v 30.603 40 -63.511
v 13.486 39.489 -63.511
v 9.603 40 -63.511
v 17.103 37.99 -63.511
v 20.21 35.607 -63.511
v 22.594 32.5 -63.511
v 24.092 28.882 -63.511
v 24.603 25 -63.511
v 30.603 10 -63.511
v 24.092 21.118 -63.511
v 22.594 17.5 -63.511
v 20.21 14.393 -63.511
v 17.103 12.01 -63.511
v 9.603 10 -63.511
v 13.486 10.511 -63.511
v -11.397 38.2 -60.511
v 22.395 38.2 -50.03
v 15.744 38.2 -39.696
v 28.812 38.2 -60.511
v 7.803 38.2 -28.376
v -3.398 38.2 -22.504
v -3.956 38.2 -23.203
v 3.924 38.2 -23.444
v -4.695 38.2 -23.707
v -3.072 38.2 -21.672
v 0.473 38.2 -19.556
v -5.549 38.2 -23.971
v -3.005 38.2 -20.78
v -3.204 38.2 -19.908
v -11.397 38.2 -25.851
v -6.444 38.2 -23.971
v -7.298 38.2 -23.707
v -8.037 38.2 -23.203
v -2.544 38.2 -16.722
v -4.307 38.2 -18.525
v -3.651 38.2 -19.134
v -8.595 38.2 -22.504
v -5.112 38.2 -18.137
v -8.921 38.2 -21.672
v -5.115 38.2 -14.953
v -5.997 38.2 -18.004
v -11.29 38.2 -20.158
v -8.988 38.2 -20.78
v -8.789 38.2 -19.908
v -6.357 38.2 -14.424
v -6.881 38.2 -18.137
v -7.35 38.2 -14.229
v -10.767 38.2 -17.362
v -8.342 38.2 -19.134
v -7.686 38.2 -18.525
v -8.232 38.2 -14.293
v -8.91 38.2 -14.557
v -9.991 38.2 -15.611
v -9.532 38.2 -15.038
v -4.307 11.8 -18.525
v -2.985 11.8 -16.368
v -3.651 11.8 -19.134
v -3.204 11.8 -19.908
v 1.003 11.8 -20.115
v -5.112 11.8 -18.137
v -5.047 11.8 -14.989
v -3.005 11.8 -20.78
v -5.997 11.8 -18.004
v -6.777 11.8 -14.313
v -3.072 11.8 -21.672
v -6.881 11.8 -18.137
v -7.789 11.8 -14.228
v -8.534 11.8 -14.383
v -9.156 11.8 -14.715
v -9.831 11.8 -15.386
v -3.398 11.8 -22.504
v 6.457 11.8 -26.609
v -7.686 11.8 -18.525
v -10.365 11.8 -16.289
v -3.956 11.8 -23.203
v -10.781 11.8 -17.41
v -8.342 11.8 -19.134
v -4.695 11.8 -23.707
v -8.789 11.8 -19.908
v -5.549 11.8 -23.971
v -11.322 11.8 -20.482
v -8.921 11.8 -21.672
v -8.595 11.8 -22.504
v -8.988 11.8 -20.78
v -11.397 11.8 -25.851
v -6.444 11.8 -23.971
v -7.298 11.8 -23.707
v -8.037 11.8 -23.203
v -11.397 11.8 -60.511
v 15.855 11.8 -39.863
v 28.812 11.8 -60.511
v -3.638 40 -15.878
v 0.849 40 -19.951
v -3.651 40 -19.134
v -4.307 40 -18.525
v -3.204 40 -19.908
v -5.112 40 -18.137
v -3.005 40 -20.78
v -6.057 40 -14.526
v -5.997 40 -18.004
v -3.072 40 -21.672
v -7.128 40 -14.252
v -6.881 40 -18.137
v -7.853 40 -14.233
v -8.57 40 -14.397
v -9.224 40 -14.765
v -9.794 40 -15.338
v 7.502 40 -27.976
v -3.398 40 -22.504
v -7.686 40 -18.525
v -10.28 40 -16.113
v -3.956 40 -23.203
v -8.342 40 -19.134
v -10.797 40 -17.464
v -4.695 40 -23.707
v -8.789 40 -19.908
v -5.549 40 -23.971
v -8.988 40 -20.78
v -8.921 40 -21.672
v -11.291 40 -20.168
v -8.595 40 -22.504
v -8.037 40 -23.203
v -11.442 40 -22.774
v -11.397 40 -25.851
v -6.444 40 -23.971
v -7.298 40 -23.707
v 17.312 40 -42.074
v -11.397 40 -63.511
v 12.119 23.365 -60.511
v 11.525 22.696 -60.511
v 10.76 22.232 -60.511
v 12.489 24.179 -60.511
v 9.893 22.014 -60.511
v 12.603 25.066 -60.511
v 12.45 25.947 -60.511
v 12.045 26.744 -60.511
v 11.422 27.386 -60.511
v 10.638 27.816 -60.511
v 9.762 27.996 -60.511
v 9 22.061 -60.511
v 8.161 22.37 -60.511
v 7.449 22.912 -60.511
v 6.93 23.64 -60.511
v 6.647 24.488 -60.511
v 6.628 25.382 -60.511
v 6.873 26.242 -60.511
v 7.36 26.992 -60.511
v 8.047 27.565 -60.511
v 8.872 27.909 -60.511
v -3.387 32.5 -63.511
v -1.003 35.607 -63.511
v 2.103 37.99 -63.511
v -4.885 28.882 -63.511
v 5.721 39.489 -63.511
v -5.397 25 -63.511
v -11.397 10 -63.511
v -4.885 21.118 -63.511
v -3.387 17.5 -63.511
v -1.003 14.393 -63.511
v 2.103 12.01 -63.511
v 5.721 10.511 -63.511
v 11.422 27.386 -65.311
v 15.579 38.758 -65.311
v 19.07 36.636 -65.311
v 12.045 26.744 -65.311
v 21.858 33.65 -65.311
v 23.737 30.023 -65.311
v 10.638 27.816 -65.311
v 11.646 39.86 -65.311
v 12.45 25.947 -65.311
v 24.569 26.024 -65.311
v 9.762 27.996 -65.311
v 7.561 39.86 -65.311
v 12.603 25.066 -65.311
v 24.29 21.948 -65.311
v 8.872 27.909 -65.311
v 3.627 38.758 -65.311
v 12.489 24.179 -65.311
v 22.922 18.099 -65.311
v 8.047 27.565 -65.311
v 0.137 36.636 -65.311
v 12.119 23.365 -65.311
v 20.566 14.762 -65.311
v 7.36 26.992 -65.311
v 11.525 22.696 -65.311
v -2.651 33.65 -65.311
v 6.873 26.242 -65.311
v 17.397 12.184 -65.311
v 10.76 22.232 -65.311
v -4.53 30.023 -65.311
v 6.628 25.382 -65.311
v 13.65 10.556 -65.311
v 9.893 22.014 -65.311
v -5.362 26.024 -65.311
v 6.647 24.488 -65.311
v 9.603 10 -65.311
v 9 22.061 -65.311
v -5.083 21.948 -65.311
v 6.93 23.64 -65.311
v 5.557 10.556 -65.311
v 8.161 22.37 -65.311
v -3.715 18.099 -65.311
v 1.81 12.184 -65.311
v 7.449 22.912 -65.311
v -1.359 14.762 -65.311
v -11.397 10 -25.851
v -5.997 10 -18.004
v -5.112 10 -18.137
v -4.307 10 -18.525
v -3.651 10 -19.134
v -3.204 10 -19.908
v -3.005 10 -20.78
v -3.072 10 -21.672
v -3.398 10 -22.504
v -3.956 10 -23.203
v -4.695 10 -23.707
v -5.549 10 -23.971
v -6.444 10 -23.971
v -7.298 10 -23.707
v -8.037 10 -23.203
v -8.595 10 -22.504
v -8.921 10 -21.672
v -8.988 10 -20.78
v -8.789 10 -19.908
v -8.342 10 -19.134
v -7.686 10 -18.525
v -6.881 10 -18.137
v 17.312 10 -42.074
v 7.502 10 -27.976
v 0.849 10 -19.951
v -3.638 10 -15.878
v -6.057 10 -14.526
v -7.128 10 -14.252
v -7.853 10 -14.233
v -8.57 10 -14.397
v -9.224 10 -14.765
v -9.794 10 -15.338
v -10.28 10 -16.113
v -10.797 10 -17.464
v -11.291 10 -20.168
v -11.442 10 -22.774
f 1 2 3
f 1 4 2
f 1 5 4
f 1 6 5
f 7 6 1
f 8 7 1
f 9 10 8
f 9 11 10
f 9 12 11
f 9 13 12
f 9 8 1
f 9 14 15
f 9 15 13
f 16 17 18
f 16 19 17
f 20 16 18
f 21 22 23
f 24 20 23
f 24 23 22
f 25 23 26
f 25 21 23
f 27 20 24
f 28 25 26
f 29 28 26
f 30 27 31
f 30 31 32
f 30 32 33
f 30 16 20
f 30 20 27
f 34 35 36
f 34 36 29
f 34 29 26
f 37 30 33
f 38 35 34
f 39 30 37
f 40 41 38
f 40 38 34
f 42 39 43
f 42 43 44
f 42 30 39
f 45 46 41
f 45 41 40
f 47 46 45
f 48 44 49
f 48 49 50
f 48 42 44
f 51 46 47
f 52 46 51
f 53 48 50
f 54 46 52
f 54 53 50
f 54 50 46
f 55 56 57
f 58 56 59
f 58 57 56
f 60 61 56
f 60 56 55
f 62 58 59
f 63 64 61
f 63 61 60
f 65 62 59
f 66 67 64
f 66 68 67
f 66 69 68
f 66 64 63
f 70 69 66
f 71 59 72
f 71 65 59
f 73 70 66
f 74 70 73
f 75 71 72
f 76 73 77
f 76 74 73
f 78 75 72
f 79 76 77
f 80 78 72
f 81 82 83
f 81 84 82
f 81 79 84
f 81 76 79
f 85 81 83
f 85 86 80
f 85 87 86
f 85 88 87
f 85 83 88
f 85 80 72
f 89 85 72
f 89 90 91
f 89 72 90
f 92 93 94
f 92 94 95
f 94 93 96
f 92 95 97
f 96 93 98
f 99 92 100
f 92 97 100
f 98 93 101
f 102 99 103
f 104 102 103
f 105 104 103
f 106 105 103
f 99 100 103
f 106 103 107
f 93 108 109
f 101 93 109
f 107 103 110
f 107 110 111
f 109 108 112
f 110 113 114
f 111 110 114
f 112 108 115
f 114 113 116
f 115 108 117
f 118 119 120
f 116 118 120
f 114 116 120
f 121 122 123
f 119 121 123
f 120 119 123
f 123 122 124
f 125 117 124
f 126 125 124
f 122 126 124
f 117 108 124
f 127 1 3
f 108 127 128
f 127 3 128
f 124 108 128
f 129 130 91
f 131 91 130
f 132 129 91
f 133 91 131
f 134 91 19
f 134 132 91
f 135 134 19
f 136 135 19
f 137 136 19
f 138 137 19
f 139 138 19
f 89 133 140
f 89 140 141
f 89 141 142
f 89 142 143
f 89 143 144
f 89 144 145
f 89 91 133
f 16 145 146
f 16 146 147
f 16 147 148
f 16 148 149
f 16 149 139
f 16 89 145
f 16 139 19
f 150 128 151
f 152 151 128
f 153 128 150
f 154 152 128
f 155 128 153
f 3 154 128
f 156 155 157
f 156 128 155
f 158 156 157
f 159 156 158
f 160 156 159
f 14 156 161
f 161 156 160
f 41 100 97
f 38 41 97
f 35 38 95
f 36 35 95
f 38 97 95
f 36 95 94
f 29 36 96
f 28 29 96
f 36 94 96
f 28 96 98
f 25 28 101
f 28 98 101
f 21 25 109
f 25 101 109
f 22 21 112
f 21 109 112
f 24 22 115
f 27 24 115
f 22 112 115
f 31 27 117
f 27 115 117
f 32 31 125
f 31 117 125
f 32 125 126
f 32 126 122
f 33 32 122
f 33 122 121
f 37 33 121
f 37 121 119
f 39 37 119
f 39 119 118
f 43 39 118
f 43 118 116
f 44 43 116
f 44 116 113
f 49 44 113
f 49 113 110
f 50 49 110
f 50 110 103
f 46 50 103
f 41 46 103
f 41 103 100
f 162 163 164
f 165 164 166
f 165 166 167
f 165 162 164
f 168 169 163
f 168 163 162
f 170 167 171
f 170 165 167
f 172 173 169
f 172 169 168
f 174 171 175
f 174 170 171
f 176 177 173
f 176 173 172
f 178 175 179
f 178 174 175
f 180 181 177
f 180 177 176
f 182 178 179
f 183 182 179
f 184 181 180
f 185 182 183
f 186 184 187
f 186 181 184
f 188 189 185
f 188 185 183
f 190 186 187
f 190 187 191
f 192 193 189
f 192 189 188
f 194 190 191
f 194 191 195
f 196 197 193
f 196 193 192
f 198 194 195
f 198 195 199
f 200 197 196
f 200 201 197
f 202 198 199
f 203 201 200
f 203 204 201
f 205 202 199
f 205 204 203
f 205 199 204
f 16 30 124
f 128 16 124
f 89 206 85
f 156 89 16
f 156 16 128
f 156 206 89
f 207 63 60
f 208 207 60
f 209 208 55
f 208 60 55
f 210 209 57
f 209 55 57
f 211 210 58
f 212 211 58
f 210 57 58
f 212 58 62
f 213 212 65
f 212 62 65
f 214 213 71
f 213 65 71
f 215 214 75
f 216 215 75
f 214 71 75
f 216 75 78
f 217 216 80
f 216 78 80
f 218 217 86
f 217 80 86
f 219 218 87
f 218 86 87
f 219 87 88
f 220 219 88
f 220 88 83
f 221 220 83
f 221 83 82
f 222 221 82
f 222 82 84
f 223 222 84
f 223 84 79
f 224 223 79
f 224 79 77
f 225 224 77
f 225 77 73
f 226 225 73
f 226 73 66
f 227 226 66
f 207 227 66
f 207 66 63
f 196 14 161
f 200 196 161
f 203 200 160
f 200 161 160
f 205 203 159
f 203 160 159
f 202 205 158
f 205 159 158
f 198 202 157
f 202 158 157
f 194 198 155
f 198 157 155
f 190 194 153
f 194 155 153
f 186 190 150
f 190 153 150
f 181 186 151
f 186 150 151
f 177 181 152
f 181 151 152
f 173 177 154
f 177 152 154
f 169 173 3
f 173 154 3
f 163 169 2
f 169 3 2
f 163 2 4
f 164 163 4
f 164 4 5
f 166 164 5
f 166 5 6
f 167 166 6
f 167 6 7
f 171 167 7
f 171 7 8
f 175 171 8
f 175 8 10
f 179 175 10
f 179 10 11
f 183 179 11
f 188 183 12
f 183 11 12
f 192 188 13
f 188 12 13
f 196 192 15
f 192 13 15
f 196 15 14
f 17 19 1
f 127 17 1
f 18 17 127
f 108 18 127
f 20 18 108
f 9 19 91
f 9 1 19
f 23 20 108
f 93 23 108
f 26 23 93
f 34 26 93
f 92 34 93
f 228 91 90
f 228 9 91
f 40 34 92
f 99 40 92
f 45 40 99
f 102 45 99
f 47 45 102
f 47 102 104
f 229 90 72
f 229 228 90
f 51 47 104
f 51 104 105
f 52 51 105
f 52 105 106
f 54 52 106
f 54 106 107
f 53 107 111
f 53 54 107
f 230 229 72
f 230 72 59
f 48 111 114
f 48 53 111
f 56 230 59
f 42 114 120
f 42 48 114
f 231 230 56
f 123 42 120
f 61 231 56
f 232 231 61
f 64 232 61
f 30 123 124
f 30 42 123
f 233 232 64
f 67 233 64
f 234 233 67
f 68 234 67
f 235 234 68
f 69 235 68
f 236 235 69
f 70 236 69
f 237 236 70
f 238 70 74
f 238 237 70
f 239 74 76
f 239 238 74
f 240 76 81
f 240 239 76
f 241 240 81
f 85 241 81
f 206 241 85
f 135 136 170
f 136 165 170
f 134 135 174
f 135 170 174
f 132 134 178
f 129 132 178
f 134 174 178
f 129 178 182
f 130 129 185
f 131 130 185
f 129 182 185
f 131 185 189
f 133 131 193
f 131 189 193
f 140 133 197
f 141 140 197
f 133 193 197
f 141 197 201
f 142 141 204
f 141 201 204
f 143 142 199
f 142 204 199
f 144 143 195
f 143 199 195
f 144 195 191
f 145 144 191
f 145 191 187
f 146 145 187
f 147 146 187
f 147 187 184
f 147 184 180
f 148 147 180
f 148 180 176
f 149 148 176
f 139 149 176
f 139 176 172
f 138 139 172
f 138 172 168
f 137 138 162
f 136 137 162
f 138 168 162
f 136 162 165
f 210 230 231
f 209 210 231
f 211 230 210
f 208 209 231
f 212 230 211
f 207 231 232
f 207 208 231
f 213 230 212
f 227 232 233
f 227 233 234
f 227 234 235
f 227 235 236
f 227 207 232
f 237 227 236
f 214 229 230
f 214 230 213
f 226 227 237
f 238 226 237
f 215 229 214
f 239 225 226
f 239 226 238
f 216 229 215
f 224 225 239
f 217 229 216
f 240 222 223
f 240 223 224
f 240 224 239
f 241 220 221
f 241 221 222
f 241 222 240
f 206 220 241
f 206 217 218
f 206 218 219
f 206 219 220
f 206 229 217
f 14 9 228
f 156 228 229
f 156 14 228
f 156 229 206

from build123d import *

# Parameters (mm, degrees)
EXTRUDE_1_DEPTH      = 50
SKETCH_2_R           = 4.999999999999998
CUT_EXTRUDE_1_DEPTH  = 98.87084830229739
SKETCH_3_R           = 15
EXTRUDE_2_DEPTH      = 3
CUT_EXTRUDE_3_REACH  = 108.899
SKETCH_5_R           = 5.000000000000001
SKETCH_6_R           = 5.0000000000000036
CUT_EXTRUDE_5_DEPTH  = 107.89919436089083
CUT_EXTRUDE_7_DEPTH  = 120.99999999999977
CUT_EXTRUDE_10_DEPTH = 10
SKETCH_9_R           = 25
SKETCH_9_R_2         = 15
EXTRUDE_3_DEPTH      = 3
SKETCH_10_R          = 5.0000000000000036
EXTRUDE_4_DEPTH      = 8
SKETCH_11_W          = 70
SKETCH_11_H          = 50.00000000000001
CUT_EXTRUDE_11_DEPTH = 8
SKETCH_12_R          = 25.000000000000004
EXTRUDE_6_DEPTH      = 3
CUT_EXTRUDE_14_DEPTH = 6.500000000000001
SCALE_1_SCALE        = 0.5
SCALE_2_SCALE        = 1.2


with BuildPart() as part:
    # 草图1 → 凸台-拉伸1 (new body)
    with BuildSketch(Plane(origin=(0, 0, 0), x_dir=(1, 0, 0), z_dir=(0, 1, 0))):
        with BuildLine():
            Line((-23.323422211177558, 7.232068902691513), (-23.323422211177558, 70))
            Line((-23.323422211177558, 70), (46.67657778882245, 70))
            add(Edge.make_bspline(
                [(46.67657778882245, 70), (-25.880344692728325, -52.054397164609135), (-23.323422211177558, 7.232068902691513)],
                knots=[0, 0, 0, 1, 1, 1], degree=2))
        make_face()
    extrude(amount=EXTRUDE_1_DEPTH)

    # 草图2 → 切除-拉伸1 (cut, through all)
    with BuildSketch(Plane(origin=(0, 50, 0), x_dir=(1, 0, 0), z_dir=(0, 1, 0))):
        with Locations(Location((-14.323422211177558, -0.8457019663808466, 0), (0, 0, 270))):
            Circle(SKETCH_2_R)
    extrude(amount=-CUT_EXTRUDE_1_DEPTH, mode=Mode.SUBTRACT)

    # 草图3 → 凸台-拉伸2 (add)
    with BuildSketch(Plane(origin=(0, 0, -70), x_dir=(-1, 0, 0), z_dir=(0, 0, -1))):
        with Locations(Location((-21.676577788822446, 25, 0), (0, 0, 180))):
            Circle(SKETCH_3_R)
    extrude(amount=EXTRUDE_2_DEPTH)

    # 草图5 → 切除-拉伸3 (cut, up to next)
    with BuildSketch(Plane(origin=(0, 0, -70), x_dir=(-1, 0, 0), z_dir=(0, 0, -1)), mode=Mode.PRIVATE) as cut_extrude_3_sk1:
        with Locations((-21.676577788822446, 25)):
            Circle(SKETCH_5_R)
    cut_extrude_3_tool1 = extrude(cut_extrude_3_sk1.sketch, amount=-CUT_EXTRUDE_3_REACH, mode=Mode.PRIVATE) & part.part
    add(cut_extrude_3_tool1.solids().sort_by_distance((21.676578, 25, -70))[0], mode=Mode.SUBTRACT)

    # 草图6 → 切除-拉伸5 (cut, through all)
    with BuildSketch(Plane.XY.offset(-70)):
        with Locations(Location((21.676577788822446, 25, 0), (0, 0, 180))):
            Circle(SKETCH_6_R)
    extrude(amount=-CUT_EXTRUDE_5_DEPTH, mode=Mode.SUBTRACT)

    # 草图7 → 切除-拉伸7 (cut)
    with BuildSketch(Plane.ZY.offset(23.323422211177558)):
        Polygon((-65.00000000000001, 47), (34.99999999999999, 47), (34.99999999999999, 3.0000000000000027), (-65.00000000000001, 3.0000000000000018), align=None)
    extrude(amount=-CUT_EXTRUDE_7_DEPTH, mode=Mode.SUBTRACT)

    # 草图8 → 切除-拉伸10 (cut)
    with BuildSketch(Plane(origin=(-23.323422211177558, 0, 0), x_dir=(0, 0, -1), z_dir=(1, 0, 0))):
        Polygon((7.232068902691513, 3.0000000000000027), (7.232068902691513, 47), (4.887844e-11, 47), (4.887757e-11, 3.000000000000002), align=None)
    extrude(amount=-CUT_EXTRUDE_10_DEPTH, mode=Mode.SUBTRACT)

    # 草图9 → 凸台-拉伸3 (add)
    with BuildSketch(Plane(origin=(0, 0, -70), x_dir=(-1, 0, 0), z_dir=(0, 0, -1))):
        with Locations(Location((-21.676577788822446, 25, 0), (0, 0, 180))):
            Circle(SKETCH_9_R)
        with Locations((-21.676577788822446, 25)):
            Circle(SKETCH_9_R_2, mode=Mode.SUBTRACT)
    extrude(amount=EXTRUDE_3_DEPTH)

    # 草图10 → 凸台-拉伸4 (add)
    with BuildSketch(Plane(origin=(0, 0, -73.00000000000001), x_dir=(-1, 0, 0), z_dir=(0, 0, -1))):
        with Locations((-21.676577788822446, 25)):
            Circle(SKETCH_10_R)
    extrude(amount=-EXTRUDE_4_DEPTH)

    # 草图11 → 切除-拉伸11 (cut)
    with BuildSketch(Plane(origin=(0, 0, -70), x_dir=(-1, 0, 0), z_dir=(0, 0, -1))):
        with Locations((-11.676577788822447, 25.000000000000004)):
            Rectangle(SKETCH_11_W, SKETCH_11_H)
    extrude(amount=CUT_EXTRUDE_11_DEPTH, mode=Mode.SUBTRACT)

    # 草图12 → 凸台-拉伸6 (add)
    with BuildSketch(Plane(origin=(0, 0, -70), x_dir=(-1, 0, 0), z_dir=(0, 0, -1))):
        with Locations(Location((-11.676577788822453, 25.000000000000004, 0), (0, 0, 270))):
            Circle(SKETCH_12_R)
    extrude(amount=EXTRUDE_6_DEPTH)

    # 草图19 → 切除-拉伸14 (cut, symmetric)
    with BuildSketch(Plane(origin=(0, 0, -70), x_dir=(-1, 0, 0), z_dir=(0, 0, -1))):
        with BuildLine():
            ThreePointArc((-7.607910432788657, 27.906190968595336), (-11.676577788822362, 30.000000000000004), (-15.745245144856133, 27.90619096859546))
            Line((-15.745245144856124, 27.90619096859548), (-11.676577788822456, 25.000000000000004))
            Line((-11.676577788822442, 25), (-7.607910432788756, 27.90619096859549))
        make_face()
        with BuildLine():
            Line((-11.676577788822456, 25.000000000000004), (-15.745245144856124, 27.90619096859548))
            ThreePointArc((-15.745245144856133, 27.90619096859546), (-16.67657778882244, 25), (-15.745245144856128, 22.09380903140454))
            Line((-15.745245144856106, 22.093809031404525), (-11.676577788822442, 25))
        make_face()
        with BuildLine():
            Line((-7.607910432788756, 27.90619096859549), (-11.676577788822442, 25))
            Line((-11.676577788822456, 25.000000000000004), (-7.607910432788778, 22.09380903140452))
            ThreePointArc((-7.607910432788663, 22.09380903140466), (-6.915100246075392, 23.47411284496017), (-6.676577788822438, 25.000000000000004))
            ThreePointArc((-6.676577788822438, 25.000000000000004), (-6.915100246075391, 26.525887155039833), (-7.607910432788657, 27.906190968595336))
        make_face()
        with BuildLine():
            Line((-7.607910432788778, 22.09380903140452), (-11.676577788822456, 25.000000000000004))
            Line((-11.676577788822442, 25), (-15.745245144856106, 22.093809031404525))
            ThreePointArc((-15.745245144856128, 22.09380903140454), (-11.676577788822364, 20.000000000000004), (-7.607910432788663, 22.09380903140466))
        make_face()
    extrude(amount=CUT_EXTRUDE_14_DEPTH, both=True, mode=Mode.SUBTRACT)


with BuildPart() as part_1:
    # 缩放比例1: scaled about (6.493831083, 24.99994197, -53.778737611)
    add(part.part.scale(SCALE_1_SCALE).moved(Location((3.2469155415, 12.499970985, -26.8893688055))))


with BuildPart() as part_2:
    # 缩放比例2: scaled about (6.493831083, 24.99994197, -53.778737611)
    add(part_1.part.scale(SCALE_2_SCALE).moved(Location((-1.2987662165999998, -4.999988393999999, 10.755747522199997))))


solid = part_2.part
